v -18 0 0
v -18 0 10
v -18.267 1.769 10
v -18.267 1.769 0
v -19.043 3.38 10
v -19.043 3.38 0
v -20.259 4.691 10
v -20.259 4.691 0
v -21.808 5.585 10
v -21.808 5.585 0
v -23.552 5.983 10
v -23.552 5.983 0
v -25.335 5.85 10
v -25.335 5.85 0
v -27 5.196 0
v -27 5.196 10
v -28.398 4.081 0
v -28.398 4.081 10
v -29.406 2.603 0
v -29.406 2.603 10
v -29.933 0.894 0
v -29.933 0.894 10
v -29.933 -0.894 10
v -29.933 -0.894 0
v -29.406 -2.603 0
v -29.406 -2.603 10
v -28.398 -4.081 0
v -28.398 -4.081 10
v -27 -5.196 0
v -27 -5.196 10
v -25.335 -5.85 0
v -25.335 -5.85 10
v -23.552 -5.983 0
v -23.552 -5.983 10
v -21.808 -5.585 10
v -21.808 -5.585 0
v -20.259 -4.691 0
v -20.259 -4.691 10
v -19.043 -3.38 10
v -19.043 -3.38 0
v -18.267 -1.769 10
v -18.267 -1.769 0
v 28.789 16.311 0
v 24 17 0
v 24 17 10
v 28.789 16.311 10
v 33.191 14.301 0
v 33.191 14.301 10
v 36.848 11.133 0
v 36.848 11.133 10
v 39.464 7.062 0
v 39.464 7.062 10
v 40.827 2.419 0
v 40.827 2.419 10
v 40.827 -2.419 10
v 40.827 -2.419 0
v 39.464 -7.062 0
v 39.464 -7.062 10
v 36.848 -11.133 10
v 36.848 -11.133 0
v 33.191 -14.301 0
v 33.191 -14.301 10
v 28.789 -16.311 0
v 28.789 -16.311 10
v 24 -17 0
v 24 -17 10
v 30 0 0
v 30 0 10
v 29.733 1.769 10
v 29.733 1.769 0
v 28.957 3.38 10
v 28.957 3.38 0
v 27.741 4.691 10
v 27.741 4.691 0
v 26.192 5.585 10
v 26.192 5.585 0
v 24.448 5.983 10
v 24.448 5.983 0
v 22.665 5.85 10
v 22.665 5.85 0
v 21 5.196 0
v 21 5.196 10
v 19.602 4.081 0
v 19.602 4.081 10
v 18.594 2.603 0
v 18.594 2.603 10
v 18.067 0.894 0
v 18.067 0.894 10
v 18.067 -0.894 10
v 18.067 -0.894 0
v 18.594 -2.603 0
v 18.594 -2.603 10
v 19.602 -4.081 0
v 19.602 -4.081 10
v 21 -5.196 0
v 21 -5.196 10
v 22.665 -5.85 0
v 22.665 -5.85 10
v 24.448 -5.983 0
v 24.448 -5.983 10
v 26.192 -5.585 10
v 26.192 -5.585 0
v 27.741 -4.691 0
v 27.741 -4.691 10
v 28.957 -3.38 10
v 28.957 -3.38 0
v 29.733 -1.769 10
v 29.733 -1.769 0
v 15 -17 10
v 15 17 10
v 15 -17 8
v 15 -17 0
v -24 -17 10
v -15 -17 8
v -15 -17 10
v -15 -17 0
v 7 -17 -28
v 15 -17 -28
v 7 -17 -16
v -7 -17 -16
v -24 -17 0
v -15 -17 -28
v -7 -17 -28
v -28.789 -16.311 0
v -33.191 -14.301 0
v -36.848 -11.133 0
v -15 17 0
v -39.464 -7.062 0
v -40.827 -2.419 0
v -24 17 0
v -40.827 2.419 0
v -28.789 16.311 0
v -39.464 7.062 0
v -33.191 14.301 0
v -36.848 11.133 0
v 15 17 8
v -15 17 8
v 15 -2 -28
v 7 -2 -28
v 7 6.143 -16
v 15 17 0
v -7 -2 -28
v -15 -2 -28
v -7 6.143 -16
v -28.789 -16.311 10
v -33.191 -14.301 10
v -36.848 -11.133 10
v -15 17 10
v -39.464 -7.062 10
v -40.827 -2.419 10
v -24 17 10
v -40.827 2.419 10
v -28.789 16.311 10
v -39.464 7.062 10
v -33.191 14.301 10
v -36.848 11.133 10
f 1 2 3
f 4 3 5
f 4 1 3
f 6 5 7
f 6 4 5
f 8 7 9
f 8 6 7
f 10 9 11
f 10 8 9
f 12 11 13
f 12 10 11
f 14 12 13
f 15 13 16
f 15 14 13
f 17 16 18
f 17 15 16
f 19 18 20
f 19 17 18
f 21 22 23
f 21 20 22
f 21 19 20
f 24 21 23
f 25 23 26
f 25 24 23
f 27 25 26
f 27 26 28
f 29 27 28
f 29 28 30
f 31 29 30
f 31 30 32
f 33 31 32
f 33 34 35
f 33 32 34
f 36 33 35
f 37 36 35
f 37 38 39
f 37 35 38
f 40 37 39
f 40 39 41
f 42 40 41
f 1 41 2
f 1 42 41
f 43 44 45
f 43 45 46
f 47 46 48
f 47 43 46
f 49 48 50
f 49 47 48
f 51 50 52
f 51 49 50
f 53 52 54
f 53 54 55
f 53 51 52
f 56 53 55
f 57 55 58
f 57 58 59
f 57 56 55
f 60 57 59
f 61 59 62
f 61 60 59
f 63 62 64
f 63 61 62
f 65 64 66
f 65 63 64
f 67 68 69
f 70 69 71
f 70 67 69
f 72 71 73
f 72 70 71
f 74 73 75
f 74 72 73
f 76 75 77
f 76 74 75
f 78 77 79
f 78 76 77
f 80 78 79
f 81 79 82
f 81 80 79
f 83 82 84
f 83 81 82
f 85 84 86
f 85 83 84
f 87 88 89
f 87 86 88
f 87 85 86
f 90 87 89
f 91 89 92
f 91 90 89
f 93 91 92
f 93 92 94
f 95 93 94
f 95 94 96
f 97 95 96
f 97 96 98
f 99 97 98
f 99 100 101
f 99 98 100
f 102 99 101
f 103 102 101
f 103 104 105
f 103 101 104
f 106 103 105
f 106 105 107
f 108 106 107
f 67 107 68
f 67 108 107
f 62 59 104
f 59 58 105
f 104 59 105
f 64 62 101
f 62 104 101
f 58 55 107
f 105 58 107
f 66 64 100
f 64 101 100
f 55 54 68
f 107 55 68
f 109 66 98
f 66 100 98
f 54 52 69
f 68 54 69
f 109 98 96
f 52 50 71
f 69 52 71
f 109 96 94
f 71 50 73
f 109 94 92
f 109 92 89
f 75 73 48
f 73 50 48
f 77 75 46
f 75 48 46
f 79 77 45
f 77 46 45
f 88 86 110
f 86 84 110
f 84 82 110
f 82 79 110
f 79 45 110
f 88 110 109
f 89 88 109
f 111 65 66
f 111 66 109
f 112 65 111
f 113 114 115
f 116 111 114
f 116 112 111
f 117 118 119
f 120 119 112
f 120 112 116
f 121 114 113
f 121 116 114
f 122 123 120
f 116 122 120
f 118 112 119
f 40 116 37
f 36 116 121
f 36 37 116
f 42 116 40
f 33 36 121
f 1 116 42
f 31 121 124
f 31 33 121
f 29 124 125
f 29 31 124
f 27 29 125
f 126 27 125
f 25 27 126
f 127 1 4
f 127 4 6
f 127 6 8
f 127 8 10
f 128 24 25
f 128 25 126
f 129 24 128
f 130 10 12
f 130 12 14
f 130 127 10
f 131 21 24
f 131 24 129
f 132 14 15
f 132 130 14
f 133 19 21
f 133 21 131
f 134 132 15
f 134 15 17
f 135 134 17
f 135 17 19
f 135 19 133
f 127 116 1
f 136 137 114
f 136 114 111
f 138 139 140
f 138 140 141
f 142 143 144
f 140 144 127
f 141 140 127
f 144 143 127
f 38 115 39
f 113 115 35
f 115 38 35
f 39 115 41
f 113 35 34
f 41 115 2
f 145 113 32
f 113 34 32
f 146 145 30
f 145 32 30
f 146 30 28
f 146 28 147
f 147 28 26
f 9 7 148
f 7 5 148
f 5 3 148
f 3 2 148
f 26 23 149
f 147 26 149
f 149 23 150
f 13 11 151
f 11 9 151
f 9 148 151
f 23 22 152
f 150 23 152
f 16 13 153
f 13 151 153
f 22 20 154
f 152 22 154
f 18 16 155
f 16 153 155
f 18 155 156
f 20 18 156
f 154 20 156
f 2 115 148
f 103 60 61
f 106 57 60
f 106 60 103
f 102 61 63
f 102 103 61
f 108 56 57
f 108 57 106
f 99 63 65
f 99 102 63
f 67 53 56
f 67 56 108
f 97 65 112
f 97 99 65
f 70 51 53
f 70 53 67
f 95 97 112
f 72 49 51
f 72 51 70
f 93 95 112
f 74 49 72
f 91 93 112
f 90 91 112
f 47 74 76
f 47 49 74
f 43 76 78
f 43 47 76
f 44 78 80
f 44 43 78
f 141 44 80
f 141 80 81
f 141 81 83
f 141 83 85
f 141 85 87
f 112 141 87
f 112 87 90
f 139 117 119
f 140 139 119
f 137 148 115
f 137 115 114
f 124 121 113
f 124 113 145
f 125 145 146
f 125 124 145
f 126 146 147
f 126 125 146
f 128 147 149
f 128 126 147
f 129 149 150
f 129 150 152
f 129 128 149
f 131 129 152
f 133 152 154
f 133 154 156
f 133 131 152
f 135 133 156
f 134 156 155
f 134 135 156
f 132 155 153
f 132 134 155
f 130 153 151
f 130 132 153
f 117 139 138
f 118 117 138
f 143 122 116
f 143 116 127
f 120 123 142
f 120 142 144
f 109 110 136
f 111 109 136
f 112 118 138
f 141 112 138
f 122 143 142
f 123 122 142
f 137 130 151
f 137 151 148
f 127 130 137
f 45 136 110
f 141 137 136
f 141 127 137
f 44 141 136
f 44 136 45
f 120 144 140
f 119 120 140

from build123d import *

# Parameters (mm, degrees)
EXTRUDE_1_DEPTH          = 10
SKETCH_2_R               = 6
CUT_EXTRUDE_1_DEPTH      = 18
SKETCH_3_W               = 30
SKETCH_3_H               = 34
EXTRUDE_2_DEPTH          = 28
CUT_EXTRUDE_2_DEPTH      = 14
CUT_EXTRUDE_2_DEPTH_BACK = 45
SKETCH_4_W               = 14
SKETCH_4_H               = 24
CUT_EXTRUDE_3_DEPTH      = 45
SKETCH_6_W               = 30
SKETCH_6_H               = 4
CUT_EXTRUDE_5_DEPTH      = 34


with BuildPart() as part:
    # 草图1 → 凸台-拉伸1 (new body)
    with BuildSketch(Plane.XY):
        with BuildLine():
            Line((24, -17), (-24, -17))
            ThreePointArc((-24, -17), (-41, 0), (-24, 17))
            Line((-24, 17), (24, 17))
            ThreePointArc((24, 17), (41, 0), (24, -17))
        make_face()
    extrude(amount=EXTRUDE_1_DEPTH)

    # 草图2 → 切除-拉伸1 (cut)
    with BuildSketch(Plane.XY):
        with Locations((-24, 0)):
            Circle(SKETCH_2_R)
        with Locations((24, 0)):
            Circle(SKETCH_2_R)
    extrude(amount=CUT_EXTRUDE_1_DEPTH, mode=Mode.SUBTRACT)

    # 草图3 → 凸台-拉伸2 (add)
    with BuildSketch(Plane.XY):
        Rectangle(SKETCH_3_W, SKETCH_3_H)
    extrude(amount=-EXTRUDE_2_DEPTH)

    # 草图4 → 切除-拉伸2 (cut, two sides: drawn at the far end of the back side and taken through both)
    with BuildSketch(Plane.XZ.offset(17).offset(-CUT_EXTRUDE_2_DEPTH_BACK)):
        with Locations((0, -28)):
            Rectangle(SKETCH_4_W, SKETCH_4_H)
    extrude(amount=CUT_EXTRUDE_2_DEPTH + CUT_EXTRUDE_2_DEPTH_BACK, mode=Mode.SUBTRACT)

    # 草图5 → 切除-拉伸3 (cut)
    with BuildSketch(Plane.ZY.offset(15)):
        Polygon((0, 17), (-28, 17), (-28, -2), align=None)
    extrude(amount=-CUT_EXTRUDE_3_DEPTH, mode=Mode.SUBTRACT)

    # 草图6 → 切除-拉伸5 (cut)
    with BuildSketch(Plane(origin=(0, 17, 0), x_dir=(1, 0, 0), z_dir=(0, 1, 0))):
        with Locations((0, -10)):
            Rectangle(SKETCH_6_W, SKETCH_6_H)
    extrude(amount=-CUT_EXTRUDE_5_DEPTH, mode=Mode.SUBTRACT)


solid = part.part
